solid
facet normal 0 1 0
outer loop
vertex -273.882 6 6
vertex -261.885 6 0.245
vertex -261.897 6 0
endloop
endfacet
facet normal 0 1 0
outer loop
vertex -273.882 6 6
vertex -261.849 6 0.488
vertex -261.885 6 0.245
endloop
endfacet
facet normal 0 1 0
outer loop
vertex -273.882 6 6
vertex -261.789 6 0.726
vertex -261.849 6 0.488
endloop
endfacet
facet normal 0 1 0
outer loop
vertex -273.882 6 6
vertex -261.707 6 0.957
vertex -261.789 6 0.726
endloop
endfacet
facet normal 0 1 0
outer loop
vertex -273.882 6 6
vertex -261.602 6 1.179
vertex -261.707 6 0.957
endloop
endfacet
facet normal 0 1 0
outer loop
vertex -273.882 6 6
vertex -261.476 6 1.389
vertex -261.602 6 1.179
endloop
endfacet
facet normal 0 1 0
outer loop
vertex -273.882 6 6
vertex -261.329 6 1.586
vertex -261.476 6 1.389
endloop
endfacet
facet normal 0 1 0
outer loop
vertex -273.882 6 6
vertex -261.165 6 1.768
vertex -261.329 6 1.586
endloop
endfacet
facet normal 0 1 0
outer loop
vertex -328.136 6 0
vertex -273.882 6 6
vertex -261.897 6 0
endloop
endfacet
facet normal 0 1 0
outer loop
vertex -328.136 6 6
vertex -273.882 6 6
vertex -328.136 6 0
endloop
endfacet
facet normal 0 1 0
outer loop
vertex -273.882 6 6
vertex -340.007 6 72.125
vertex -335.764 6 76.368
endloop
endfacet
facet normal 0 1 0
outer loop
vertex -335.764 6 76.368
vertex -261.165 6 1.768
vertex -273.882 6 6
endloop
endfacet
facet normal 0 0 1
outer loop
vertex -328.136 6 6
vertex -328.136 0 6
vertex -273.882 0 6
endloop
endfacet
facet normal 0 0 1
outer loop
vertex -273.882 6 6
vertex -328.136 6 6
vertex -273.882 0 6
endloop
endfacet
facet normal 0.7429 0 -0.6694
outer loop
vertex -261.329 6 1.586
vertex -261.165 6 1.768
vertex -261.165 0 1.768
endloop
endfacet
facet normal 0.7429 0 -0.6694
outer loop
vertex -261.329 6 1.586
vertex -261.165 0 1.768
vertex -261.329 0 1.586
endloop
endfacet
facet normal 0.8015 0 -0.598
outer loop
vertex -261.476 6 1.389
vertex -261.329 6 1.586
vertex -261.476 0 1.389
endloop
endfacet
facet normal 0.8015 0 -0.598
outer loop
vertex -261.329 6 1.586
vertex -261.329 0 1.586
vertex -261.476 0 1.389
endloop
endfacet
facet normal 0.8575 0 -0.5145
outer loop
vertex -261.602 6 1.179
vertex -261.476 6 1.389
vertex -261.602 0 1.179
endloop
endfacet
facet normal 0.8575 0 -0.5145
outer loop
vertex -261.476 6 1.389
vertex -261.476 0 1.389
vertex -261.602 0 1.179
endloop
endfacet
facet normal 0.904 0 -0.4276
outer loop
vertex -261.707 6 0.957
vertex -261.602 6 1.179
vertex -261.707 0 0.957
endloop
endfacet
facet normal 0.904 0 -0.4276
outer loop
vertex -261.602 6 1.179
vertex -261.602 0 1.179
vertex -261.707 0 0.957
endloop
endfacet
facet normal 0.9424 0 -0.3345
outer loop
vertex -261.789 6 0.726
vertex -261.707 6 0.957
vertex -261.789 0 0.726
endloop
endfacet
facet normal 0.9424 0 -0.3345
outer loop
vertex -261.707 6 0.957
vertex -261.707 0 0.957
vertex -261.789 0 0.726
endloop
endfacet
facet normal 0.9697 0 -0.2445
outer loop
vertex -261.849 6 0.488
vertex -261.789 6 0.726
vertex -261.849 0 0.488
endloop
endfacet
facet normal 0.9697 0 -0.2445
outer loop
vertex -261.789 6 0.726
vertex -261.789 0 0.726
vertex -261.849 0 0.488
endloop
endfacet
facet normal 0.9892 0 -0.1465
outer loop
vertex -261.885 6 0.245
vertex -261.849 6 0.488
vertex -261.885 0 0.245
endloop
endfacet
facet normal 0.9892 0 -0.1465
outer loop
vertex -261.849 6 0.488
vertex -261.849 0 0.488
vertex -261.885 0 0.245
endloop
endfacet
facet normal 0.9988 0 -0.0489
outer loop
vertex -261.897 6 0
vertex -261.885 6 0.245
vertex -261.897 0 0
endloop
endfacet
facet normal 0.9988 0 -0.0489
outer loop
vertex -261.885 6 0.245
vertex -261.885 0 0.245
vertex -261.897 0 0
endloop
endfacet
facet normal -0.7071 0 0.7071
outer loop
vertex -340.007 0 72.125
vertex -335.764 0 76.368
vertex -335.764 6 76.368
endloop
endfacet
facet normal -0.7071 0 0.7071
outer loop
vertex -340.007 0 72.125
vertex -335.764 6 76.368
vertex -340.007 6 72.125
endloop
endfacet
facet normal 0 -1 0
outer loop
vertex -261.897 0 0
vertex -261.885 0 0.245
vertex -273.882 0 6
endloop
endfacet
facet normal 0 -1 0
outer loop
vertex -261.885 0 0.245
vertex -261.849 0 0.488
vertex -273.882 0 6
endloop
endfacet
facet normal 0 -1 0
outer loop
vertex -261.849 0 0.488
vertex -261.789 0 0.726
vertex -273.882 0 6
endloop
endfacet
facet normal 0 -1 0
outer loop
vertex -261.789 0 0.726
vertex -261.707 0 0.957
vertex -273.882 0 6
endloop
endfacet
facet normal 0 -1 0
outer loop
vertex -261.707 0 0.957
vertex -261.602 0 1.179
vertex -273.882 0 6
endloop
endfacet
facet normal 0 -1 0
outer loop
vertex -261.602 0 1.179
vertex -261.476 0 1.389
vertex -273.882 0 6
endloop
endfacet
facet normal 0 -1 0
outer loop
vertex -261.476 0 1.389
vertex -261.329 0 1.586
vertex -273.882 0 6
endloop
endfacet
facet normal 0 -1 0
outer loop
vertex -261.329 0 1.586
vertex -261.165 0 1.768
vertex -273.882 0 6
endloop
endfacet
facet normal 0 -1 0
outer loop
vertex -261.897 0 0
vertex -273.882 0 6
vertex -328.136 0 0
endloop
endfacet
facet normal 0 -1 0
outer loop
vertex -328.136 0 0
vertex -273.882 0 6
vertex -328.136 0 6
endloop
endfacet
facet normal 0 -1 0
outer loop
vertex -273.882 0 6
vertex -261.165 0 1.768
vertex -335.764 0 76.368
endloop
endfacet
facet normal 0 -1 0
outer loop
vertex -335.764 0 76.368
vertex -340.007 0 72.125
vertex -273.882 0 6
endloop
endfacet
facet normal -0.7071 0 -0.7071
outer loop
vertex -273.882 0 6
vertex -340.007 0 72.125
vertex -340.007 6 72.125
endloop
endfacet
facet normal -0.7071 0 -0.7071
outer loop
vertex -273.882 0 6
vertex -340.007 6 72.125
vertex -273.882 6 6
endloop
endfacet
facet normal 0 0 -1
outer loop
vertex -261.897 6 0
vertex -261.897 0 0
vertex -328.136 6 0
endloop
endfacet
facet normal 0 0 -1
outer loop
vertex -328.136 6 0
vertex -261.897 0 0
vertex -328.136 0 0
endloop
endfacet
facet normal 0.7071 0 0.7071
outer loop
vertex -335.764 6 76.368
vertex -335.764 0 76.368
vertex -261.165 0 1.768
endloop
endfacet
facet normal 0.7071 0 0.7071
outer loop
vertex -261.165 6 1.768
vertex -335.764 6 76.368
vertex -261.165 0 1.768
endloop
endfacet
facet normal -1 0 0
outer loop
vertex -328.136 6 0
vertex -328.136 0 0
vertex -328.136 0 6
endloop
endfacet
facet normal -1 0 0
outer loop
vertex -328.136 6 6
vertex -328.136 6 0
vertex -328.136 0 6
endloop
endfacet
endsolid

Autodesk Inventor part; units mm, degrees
ref_plane "YZ Plane" through (0, 0, 0) normal (1, 0, 0) x (0, 1, 0)
ref_plane "XZ Plane" through (0, 0, 0) normal (0, 1, 0) x (-1, 0, 0)
ref_plane "XY Plane" through (0, 0, 0) normal (0, 0, 1) x (1, 0, 0)
sketch "Sketch1" plane through (0, 0, 0) normal (0, 1, 0) x (-1, 0, 0)
  line L0 (0, 0) -> (200, 0)
  line L1 (200, 0) -> (306.066, 106.066)
  line L2 (306.066, 106.066) -> (335.7645, 76.3675)
  line L3 (0, 0) -> (0, -42)
  line L4 (0, -42) -> (350, -42)
  line L5 (350, -42) -> (328.1362, 0)
  line L6 (350, -42) -> (414.721, -42) construction
  line L7 (261.897, 0) -> (328.1362, 0)
  line L8 (335.7645, 76.3675) -> (261.1647, 1.7678)
  arc A0 (261.1647, 1.7678) -> (261.897, 0) centre (259.397, 0) ccw
  line L9 (328.1362, 0) -> (328.1362, 6)
  line L10 (328.1362, 6) -> (273.8823, 6)
  line L11 (335.7645, 76.3675) -> (340.0071, 72.1249)
  line L12 (340.0071, 72.1249) -> (273.8823, 6)
  arc A1 (261.897, 0) -> (261.1647, 1.7678) centre (259.397, 0) ccw
  dimension "d0" = 200
  dimension "d1" = 150
  dimension "d2" = 135
  dimension "d3" = 42
  dimension "d4" = 42
  dimension "d5" = 350
  dimension "d6" = 117.5
  dimension "d8" = 5
  dimension "d9" = 6
  dimension "d10" = 6
  dimension "d13" = 66.2392
  dimension "d14" = 54.2539
extrude "Extrusion1" add sketch "Sketch1" along normal blind 6 contours L11 L12 L10 L9 L7 A1 L8
properties part number "A_LeftWall2(plan)_5"
